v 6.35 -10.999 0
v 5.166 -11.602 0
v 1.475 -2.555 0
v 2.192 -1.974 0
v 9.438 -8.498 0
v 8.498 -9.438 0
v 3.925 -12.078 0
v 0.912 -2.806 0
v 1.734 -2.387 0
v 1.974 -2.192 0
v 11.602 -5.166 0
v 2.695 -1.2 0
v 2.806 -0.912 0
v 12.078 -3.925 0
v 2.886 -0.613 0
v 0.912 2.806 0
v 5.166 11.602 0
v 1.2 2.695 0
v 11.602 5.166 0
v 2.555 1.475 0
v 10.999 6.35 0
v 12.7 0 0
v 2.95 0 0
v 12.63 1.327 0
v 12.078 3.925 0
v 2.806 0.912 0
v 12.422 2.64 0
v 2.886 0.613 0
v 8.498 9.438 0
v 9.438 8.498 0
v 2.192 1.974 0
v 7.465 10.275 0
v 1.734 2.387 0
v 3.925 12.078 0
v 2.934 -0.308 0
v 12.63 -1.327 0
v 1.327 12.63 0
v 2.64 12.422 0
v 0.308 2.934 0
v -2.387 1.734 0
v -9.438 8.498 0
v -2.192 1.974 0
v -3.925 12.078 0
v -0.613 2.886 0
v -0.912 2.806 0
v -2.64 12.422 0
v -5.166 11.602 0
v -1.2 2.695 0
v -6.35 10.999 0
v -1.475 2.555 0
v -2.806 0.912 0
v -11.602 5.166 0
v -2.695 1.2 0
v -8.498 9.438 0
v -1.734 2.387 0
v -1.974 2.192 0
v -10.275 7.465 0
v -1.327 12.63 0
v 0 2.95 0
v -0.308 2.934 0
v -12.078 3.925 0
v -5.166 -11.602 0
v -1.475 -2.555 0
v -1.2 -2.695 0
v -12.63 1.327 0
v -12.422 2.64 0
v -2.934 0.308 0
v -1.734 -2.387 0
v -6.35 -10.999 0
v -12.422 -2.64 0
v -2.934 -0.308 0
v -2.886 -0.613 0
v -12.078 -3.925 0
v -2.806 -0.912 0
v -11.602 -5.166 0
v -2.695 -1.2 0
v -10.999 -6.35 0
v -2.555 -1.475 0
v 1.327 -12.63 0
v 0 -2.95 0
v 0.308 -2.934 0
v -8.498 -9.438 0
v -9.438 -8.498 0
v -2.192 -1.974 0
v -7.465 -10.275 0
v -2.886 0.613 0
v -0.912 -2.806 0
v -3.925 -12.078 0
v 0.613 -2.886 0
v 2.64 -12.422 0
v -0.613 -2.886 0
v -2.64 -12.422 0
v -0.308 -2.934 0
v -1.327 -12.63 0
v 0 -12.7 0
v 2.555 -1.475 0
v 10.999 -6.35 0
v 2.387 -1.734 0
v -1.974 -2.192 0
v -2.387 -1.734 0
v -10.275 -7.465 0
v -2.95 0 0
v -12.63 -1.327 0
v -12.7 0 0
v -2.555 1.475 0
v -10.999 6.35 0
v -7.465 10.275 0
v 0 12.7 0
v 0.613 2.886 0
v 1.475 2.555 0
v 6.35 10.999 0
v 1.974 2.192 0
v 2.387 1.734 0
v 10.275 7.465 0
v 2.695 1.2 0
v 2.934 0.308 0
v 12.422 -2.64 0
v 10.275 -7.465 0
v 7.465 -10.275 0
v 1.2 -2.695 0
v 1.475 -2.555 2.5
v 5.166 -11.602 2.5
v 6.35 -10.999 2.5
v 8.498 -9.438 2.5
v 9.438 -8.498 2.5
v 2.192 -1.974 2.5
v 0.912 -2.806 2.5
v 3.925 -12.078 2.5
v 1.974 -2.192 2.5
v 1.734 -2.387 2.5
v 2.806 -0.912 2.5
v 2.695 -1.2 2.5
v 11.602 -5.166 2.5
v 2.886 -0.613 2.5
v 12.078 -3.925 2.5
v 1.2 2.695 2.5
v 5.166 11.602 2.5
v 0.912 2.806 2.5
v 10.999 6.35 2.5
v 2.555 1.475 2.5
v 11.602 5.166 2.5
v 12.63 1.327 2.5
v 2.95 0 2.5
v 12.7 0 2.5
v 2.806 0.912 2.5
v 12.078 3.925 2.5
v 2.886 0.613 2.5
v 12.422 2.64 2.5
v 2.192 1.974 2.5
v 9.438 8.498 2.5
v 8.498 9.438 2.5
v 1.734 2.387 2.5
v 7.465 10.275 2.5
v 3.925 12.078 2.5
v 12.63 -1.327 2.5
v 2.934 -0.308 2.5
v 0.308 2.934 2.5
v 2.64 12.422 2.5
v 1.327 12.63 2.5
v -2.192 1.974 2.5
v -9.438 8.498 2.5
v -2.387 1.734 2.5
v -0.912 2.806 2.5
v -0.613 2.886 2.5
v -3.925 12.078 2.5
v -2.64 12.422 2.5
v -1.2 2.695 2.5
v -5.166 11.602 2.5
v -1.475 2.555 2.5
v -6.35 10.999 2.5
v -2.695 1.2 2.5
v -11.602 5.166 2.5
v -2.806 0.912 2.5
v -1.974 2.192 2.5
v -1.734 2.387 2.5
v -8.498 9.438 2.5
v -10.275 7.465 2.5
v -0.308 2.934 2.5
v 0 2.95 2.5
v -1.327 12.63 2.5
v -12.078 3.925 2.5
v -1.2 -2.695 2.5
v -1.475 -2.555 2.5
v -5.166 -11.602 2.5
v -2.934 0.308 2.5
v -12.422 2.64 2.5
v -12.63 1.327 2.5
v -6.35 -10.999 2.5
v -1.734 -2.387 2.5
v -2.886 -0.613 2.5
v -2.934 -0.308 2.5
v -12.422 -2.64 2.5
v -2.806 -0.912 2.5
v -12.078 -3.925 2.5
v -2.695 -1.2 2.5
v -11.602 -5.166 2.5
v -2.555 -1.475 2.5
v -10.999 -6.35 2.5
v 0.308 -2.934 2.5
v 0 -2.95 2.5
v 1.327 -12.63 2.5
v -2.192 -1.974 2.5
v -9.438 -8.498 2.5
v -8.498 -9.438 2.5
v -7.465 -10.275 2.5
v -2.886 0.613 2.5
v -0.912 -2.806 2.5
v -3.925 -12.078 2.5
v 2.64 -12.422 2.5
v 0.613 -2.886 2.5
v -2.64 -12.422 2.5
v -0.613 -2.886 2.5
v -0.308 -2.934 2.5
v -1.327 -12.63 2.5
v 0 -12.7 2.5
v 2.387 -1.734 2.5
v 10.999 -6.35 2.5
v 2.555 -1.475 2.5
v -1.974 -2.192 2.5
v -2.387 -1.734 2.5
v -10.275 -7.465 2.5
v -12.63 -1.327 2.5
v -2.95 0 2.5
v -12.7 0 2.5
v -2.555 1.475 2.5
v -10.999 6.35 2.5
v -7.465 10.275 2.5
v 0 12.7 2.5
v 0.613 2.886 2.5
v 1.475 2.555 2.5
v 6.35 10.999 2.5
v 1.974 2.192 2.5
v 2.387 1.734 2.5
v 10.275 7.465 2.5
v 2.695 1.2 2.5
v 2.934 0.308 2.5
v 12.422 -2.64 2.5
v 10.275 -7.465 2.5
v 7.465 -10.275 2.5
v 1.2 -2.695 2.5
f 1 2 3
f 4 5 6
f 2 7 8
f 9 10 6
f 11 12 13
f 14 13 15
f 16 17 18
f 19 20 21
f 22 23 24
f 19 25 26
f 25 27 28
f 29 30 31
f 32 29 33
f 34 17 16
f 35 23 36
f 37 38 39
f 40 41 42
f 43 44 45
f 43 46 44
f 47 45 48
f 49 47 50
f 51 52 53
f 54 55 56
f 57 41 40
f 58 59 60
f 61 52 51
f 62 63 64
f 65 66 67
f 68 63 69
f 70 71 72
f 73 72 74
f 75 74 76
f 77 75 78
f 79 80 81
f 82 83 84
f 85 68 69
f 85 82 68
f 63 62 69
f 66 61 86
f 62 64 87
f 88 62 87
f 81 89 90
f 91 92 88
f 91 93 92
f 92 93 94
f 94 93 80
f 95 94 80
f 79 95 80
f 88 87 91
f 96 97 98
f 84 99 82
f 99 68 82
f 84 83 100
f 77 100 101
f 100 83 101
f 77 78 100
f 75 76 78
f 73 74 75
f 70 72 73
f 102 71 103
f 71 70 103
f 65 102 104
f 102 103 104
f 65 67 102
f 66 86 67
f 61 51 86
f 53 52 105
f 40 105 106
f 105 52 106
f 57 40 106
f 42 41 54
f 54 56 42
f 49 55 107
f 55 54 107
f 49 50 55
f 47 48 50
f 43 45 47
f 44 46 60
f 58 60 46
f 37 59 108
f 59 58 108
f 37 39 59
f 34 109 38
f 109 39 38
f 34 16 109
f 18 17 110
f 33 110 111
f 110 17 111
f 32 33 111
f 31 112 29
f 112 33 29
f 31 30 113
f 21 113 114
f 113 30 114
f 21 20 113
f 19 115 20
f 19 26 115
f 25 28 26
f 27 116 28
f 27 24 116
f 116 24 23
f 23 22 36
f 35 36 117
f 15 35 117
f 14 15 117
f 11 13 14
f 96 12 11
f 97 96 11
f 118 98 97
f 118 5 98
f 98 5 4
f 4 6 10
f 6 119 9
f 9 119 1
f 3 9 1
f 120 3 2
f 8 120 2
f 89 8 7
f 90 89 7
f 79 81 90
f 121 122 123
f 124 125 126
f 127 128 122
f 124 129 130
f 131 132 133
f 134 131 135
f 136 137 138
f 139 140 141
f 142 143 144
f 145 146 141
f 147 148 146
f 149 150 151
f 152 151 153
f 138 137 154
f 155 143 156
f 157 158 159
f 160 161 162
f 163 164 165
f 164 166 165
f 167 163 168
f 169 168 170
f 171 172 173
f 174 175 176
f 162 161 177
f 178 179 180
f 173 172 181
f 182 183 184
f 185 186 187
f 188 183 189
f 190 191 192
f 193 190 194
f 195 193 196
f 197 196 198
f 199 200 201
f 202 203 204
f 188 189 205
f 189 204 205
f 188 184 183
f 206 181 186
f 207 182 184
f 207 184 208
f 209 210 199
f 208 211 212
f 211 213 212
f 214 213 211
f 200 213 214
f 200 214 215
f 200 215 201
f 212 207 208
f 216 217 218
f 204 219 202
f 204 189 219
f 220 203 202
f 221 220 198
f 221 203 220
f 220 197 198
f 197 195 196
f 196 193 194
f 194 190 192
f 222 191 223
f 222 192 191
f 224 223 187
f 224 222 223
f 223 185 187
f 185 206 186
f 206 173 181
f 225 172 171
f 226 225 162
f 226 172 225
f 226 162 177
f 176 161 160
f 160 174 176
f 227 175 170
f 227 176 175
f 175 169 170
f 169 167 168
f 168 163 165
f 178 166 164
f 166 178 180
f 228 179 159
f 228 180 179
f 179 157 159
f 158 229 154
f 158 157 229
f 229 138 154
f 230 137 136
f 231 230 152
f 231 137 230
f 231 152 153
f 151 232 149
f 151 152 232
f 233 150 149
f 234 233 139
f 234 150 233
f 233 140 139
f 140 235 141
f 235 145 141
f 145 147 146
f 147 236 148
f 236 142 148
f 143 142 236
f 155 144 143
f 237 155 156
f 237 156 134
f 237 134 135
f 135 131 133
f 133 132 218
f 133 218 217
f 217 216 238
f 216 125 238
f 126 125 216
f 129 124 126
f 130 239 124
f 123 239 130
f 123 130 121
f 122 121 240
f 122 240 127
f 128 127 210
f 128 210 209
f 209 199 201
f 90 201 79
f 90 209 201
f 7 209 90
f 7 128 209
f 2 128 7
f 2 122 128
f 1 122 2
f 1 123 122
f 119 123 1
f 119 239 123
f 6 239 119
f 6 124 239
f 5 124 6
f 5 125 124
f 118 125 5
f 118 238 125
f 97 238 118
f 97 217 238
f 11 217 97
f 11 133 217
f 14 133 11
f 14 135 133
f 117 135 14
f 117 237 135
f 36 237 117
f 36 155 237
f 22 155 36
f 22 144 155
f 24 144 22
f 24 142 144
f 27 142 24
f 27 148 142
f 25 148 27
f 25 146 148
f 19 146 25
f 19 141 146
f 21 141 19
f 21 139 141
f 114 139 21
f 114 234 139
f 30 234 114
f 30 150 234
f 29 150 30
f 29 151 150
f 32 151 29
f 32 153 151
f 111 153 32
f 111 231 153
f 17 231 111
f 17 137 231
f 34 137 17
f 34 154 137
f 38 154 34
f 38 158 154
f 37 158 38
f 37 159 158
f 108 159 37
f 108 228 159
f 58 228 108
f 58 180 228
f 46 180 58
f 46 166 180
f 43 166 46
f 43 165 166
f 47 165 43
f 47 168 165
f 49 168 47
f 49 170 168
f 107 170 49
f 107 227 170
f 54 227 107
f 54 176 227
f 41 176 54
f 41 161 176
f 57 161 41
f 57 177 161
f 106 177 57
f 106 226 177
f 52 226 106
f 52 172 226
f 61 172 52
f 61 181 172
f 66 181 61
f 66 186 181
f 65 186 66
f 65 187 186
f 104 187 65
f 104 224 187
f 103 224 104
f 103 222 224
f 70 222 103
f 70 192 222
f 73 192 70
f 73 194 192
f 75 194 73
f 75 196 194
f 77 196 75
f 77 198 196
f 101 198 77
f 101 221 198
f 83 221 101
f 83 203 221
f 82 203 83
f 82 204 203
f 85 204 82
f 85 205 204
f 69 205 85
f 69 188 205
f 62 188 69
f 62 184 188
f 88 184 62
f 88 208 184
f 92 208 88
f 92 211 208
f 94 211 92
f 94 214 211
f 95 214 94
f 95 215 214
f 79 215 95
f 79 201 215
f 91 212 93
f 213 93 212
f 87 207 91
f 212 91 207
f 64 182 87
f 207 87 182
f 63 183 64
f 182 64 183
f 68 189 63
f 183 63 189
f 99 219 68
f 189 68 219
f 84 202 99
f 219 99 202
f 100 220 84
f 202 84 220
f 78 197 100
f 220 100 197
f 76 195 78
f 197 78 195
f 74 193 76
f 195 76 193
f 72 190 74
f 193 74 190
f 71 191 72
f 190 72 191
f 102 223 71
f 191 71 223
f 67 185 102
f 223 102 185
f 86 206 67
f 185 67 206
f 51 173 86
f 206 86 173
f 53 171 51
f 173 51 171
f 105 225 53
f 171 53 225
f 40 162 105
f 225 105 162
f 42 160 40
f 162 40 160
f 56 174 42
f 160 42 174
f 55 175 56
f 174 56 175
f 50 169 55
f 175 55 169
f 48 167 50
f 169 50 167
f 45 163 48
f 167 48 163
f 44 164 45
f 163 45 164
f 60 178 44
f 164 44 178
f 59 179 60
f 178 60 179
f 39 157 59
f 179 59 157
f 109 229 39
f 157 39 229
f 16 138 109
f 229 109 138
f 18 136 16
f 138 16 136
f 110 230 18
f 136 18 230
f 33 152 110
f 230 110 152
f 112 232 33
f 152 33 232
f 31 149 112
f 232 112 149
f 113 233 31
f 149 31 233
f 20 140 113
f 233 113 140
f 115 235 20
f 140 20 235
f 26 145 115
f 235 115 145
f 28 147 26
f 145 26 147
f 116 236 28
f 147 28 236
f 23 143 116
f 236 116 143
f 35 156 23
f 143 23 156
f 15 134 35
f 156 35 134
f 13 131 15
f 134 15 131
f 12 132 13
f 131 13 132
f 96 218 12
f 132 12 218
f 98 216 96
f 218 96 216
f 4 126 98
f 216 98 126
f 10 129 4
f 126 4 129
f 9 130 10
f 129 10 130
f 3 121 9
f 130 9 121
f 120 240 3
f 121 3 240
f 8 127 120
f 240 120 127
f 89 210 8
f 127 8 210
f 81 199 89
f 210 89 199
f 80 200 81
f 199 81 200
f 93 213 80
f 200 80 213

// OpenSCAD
$fn=60;
tolerance = .1;

diameter_pawn = 18.1 - tolerance;
diameter_bishop = 25.5 - tolerance;
diameter_magnet = 6 - tolerance;
h=2.5;

linear_extrude(height = h){
//difference(){
//    circle(d=diameter_pawn);
//    circle(d=diameter_magnet);    
//}

//translate([diameter_bishop,0,0])
difference(){
    circle(d=diameter_bishop);
    circle(d=diameter_magnet);    
}

} //strude
